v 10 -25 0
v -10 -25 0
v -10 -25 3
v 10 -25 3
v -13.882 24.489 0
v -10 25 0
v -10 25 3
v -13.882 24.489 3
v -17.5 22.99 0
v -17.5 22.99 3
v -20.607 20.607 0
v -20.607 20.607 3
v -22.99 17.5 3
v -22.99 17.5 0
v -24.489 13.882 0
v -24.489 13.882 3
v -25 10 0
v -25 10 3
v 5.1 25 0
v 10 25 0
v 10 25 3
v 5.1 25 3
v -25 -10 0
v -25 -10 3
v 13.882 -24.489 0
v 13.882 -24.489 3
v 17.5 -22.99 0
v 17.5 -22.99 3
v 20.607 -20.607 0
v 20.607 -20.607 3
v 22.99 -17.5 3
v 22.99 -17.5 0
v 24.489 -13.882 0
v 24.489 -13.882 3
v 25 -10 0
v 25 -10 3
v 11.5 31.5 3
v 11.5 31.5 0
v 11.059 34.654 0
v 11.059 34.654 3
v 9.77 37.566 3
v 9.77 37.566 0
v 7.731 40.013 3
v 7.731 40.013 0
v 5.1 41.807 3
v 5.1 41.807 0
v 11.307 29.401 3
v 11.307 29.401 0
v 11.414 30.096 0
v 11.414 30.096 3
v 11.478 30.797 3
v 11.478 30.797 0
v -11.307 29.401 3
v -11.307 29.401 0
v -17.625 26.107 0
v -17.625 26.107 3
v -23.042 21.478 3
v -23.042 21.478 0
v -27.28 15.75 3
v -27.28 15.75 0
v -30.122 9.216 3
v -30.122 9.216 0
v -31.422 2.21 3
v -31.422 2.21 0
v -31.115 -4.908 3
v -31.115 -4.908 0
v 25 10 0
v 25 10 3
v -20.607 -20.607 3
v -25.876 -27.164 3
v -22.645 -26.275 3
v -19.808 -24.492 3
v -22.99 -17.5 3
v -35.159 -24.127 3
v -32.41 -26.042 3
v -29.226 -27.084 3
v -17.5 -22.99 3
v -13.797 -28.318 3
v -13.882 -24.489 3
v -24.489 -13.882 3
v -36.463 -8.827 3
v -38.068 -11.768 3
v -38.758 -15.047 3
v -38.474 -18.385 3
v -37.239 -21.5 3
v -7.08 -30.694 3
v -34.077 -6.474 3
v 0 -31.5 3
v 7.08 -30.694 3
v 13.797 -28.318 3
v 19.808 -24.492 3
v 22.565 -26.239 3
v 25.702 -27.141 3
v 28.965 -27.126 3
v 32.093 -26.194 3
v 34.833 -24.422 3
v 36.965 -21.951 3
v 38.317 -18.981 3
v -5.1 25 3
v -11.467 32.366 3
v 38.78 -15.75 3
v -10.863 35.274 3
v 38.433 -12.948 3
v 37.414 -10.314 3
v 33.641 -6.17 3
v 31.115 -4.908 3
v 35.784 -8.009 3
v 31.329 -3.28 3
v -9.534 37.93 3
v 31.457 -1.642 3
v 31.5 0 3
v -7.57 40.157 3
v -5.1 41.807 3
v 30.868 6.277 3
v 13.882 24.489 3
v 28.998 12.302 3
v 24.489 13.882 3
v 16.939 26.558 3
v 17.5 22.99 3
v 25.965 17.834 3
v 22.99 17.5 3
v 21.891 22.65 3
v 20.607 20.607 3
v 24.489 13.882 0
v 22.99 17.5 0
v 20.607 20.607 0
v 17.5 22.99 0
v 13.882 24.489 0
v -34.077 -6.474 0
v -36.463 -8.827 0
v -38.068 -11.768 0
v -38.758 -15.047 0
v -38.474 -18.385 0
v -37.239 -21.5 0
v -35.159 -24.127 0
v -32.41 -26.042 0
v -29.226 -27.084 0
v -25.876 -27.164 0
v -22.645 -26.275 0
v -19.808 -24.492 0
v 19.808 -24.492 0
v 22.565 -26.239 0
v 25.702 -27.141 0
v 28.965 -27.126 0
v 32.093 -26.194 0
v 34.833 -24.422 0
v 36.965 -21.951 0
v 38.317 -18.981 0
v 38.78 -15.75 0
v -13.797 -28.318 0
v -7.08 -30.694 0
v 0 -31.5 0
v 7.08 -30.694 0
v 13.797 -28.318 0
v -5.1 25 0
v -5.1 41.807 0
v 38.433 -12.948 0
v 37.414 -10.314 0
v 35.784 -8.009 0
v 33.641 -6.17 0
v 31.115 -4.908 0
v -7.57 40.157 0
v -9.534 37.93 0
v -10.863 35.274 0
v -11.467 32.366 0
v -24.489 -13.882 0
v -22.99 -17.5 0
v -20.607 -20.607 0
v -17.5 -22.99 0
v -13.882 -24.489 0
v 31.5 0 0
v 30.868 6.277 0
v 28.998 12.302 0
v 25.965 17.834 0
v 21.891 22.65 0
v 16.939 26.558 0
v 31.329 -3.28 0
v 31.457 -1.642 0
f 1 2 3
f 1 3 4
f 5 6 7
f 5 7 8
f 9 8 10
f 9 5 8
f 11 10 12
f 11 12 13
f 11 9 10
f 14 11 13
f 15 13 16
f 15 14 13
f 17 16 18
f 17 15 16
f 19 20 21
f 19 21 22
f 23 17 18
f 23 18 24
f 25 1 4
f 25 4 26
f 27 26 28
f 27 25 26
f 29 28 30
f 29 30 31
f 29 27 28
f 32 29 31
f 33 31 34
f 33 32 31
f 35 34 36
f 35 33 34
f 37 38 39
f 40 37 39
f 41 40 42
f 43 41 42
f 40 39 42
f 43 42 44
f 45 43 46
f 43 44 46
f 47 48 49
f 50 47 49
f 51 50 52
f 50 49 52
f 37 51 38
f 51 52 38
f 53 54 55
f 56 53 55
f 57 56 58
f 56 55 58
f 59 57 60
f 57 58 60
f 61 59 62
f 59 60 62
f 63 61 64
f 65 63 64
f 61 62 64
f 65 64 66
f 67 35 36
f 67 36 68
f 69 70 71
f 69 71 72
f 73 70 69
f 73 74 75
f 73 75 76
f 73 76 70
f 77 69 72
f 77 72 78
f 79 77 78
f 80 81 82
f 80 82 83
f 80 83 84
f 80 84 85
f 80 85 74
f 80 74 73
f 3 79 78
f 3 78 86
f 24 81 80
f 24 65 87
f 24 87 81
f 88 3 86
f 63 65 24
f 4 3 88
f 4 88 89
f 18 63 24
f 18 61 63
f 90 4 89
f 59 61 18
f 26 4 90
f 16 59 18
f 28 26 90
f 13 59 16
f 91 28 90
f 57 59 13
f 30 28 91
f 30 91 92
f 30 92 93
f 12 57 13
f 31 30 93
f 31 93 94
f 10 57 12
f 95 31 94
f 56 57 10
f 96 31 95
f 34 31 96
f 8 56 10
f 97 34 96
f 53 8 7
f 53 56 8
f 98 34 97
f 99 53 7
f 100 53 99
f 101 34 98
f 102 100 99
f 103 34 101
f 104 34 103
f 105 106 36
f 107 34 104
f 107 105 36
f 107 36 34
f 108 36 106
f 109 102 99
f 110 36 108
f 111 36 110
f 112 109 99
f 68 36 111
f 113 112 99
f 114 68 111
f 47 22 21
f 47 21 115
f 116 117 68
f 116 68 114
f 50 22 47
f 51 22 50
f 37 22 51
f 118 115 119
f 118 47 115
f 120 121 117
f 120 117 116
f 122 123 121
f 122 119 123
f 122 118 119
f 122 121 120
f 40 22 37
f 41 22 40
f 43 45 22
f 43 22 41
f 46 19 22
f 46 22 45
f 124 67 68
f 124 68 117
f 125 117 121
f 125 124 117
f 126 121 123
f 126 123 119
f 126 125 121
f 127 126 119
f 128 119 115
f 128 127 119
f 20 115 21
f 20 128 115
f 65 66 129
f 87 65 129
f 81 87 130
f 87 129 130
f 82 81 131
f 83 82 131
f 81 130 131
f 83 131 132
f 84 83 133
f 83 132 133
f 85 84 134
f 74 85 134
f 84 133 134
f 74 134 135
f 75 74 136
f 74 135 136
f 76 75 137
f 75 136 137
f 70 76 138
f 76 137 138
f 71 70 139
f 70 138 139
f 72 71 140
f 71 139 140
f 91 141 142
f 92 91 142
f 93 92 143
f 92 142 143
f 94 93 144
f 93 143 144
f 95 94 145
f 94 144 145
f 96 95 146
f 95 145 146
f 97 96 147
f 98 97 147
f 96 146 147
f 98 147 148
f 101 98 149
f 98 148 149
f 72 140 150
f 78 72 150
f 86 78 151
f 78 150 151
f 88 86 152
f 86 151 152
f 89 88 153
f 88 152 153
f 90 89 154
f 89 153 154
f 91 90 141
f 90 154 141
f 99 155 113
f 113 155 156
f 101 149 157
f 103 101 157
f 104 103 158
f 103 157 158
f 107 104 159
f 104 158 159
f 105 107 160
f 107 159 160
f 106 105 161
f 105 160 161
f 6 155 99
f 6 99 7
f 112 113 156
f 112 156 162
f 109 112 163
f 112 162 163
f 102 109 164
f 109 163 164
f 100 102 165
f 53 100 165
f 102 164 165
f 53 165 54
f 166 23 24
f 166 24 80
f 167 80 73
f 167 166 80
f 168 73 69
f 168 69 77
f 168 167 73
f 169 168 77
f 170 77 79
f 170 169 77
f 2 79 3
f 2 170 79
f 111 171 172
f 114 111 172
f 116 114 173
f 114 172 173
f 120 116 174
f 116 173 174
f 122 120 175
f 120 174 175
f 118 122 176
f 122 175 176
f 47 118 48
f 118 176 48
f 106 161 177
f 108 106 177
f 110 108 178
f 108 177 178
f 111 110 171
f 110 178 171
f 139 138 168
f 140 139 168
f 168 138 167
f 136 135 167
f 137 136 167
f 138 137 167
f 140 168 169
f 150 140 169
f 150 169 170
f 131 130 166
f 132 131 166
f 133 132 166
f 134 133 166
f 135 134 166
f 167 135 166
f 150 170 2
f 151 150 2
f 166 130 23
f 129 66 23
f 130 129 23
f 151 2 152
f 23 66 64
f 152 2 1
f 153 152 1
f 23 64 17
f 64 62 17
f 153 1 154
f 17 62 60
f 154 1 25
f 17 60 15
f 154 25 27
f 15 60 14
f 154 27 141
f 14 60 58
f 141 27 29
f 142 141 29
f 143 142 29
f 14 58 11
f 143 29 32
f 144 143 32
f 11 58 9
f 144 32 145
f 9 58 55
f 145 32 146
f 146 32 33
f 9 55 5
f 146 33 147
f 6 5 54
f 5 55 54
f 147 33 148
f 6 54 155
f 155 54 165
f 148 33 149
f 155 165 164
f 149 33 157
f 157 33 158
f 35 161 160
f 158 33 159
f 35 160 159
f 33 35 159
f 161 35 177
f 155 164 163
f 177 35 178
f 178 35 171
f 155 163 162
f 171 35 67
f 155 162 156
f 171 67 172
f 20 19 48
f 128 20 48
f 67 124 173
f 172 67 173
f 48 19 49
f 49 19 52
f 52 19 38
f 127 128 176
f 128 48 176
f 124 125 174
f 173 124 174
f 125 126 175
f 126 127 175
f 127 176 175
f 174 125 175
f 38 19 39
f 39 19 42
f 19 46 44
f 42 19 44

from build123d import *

# Parameters (mm, degrees)
F2_DEPTH = 3
F1_W     = 10.2
F1_H     = 8.1991158426
F1_H_2   = 21.2707020342
F3_DEPTH = 3


with BuildPart() as f2:
    # F0 (on Top) → F2 (new body)
    with BuildSketch(Plane.XY):
        with BuildLine():
            ThreePointArc((11.3067825639, 29.4007936636), (11.4515937375, 30.4459601281), (11.4999999642, 31.5))
            ThreePointArc((11.4999999642, 31.5), (-1.0540399207, 42.9515937721), (-11.3067826307, 29.4007936379))
            ThreePointArc((-11.3067826307, 29.4007936379), (-3.58e-08, 31.5), (11.3067825639, 29.4007936636))
        make_face()
        with BuildLine():
            ThreePointArc((11.3067825639, 29.4007936636), (-3.58e-08, 31.5), (-11.3067826307, 29.4007936379))
            ThreePointArc((-11.3067826307, 29.4007936379), (-2.27e-08, 20), (11.3067825639, 29.4007936636))
        make_face()
        with BuildLine():
            ThreePointArc((11.3067825639, 29.4007936636), (-2.27e-08, 20), (-11.3067826307, 29.4007936379))
            ThreePointArc((-11.3067826307, 29.4007936379), (-27.2798002371, 15.749999969), (-31.1152254861, -4.9084358964))
            ThreePointArc((-31.1152254861, -4.9084358964), (-20.641178009, -6.3596488455), (-15.7798002013, -15.750000031))
            ThreePointArc((-15.7798002013, -15.750000031), (-16.8354091384, -20.5629716001), (-19.8084428665, -24.4923578123))
            ThreePointArc((-19.8084428665, -24.4923578123), (3.58e-08, -31.5), (19.8084429222, -24.4923577673))
            ThreePointArc((19.8084429222, -24.4923577673), (17.320508087, -9.9999999803), (31.1152254973, -4.9084358257))
            ThreePointArc((31.1152254973, -4.9084358257), (31.4036590477, -2.4617470256), (31.5, 0))
            ThreePointArc((31.5, 0), (25.965492974, 17.8337650152), (11.3067825639, 29.4007936636))
        make_face()
        with BuildLine():
            ThreePointArc((-19.8084428665, -24.4923578123), (-27.2798002013, -15.750000031), (-31.1152254861, -4.9084358964))
            ThreePointArc((-31.1152254861, -4.9084358964), (-37.2390923383, -21.5000000423), (-19.8084428665, -24.4923578123))
        make_face()
        with BuildLine():
            ThreePointArc((-15.7798002013, -15.750000031), (-20.641178009, -6.3596488455), (-31.1152254861, -4.9084358964))
            ThreePointArc((-31.1152254861, -4.9084358964), (-27.2798002013, -15.750000031), (-19.8084428665, -24.4923578123))
            ThreePointArc((-19.8084428665, -24.4923578123), (-16.8354091384, -20.5629716001), (-15.7798002013, -15.750000031))
        make_face()
        with BuildLine():
            ThreePointArc((19.8084429222, -24.4923577673), (27.2798002371, -15.749999969), (31.1152254973, -4.9084358257))
            ThreePointArc((31.1152254973, -4.9084358257), (17.320508087, -9.9999999803), (19.8084429222, -24.4923577673))
        make_face()
        with BuildLine():
            ThreePointArc((38.7798002371, -15.749999969), (36.6701514151, -9.111377766), (31.1152254973, -4.9084358257))
            ThreePointArc((31.1152254973, -4.9084358257), (27.2798002371, -15.749999969), (19.8084429222, -24.4923577673))
            ThreePointArc((19.8084429222, -24.4923577673), (32.0927718181, -26.1943910265), (38.7798002371, -15.749999969))
        make_face()
    extrude(amount=F2_DEPTH)

    # F1 (on Top) → F3 (cut)
    with BuildSketch(Plane.XY):
        with BuildLine():
            Line((5.1, 25), (5.1, 16.8008841574))
            Line((5.1, 16.8008841574), (-5.1, 16.8008841574))
            Line((-5.1, 16.8008841574), (-5.1, 25))
            Line((-5.1, 25), (-10, 25))
            ThreePointArc((-10, 25), (-20.6066017178, 20.6066017178), (-25, 10))
            Line((-25, 10), (-25, -10))
            ThreePointArc((-25, -10), (-20.6066017178, -20.6066017178), (-10, -25))
            Line((-10, -25), (10, -25))
            ThreePointArc((10, -25), (20.6066017178, -20.6066017178), (25, -10))
            Line((25, -10), (25, 10))
            ThreePointArc((25, 10), (20.6066017178, 20.6066017178), (10, 25))
            Line((10, 25), (5.1, 25))
        make_face()
        with Locations((0, 20.9004420787)):
            Rectangle(F1_W, F1_H)
        with Locations((0, 35.6353510171)):
            Rectangle(F1_W, F1_H_2)
    extrude(amount=F3_DEPTH, mode=Mode.SUBTRACT)


solid = f2.part
